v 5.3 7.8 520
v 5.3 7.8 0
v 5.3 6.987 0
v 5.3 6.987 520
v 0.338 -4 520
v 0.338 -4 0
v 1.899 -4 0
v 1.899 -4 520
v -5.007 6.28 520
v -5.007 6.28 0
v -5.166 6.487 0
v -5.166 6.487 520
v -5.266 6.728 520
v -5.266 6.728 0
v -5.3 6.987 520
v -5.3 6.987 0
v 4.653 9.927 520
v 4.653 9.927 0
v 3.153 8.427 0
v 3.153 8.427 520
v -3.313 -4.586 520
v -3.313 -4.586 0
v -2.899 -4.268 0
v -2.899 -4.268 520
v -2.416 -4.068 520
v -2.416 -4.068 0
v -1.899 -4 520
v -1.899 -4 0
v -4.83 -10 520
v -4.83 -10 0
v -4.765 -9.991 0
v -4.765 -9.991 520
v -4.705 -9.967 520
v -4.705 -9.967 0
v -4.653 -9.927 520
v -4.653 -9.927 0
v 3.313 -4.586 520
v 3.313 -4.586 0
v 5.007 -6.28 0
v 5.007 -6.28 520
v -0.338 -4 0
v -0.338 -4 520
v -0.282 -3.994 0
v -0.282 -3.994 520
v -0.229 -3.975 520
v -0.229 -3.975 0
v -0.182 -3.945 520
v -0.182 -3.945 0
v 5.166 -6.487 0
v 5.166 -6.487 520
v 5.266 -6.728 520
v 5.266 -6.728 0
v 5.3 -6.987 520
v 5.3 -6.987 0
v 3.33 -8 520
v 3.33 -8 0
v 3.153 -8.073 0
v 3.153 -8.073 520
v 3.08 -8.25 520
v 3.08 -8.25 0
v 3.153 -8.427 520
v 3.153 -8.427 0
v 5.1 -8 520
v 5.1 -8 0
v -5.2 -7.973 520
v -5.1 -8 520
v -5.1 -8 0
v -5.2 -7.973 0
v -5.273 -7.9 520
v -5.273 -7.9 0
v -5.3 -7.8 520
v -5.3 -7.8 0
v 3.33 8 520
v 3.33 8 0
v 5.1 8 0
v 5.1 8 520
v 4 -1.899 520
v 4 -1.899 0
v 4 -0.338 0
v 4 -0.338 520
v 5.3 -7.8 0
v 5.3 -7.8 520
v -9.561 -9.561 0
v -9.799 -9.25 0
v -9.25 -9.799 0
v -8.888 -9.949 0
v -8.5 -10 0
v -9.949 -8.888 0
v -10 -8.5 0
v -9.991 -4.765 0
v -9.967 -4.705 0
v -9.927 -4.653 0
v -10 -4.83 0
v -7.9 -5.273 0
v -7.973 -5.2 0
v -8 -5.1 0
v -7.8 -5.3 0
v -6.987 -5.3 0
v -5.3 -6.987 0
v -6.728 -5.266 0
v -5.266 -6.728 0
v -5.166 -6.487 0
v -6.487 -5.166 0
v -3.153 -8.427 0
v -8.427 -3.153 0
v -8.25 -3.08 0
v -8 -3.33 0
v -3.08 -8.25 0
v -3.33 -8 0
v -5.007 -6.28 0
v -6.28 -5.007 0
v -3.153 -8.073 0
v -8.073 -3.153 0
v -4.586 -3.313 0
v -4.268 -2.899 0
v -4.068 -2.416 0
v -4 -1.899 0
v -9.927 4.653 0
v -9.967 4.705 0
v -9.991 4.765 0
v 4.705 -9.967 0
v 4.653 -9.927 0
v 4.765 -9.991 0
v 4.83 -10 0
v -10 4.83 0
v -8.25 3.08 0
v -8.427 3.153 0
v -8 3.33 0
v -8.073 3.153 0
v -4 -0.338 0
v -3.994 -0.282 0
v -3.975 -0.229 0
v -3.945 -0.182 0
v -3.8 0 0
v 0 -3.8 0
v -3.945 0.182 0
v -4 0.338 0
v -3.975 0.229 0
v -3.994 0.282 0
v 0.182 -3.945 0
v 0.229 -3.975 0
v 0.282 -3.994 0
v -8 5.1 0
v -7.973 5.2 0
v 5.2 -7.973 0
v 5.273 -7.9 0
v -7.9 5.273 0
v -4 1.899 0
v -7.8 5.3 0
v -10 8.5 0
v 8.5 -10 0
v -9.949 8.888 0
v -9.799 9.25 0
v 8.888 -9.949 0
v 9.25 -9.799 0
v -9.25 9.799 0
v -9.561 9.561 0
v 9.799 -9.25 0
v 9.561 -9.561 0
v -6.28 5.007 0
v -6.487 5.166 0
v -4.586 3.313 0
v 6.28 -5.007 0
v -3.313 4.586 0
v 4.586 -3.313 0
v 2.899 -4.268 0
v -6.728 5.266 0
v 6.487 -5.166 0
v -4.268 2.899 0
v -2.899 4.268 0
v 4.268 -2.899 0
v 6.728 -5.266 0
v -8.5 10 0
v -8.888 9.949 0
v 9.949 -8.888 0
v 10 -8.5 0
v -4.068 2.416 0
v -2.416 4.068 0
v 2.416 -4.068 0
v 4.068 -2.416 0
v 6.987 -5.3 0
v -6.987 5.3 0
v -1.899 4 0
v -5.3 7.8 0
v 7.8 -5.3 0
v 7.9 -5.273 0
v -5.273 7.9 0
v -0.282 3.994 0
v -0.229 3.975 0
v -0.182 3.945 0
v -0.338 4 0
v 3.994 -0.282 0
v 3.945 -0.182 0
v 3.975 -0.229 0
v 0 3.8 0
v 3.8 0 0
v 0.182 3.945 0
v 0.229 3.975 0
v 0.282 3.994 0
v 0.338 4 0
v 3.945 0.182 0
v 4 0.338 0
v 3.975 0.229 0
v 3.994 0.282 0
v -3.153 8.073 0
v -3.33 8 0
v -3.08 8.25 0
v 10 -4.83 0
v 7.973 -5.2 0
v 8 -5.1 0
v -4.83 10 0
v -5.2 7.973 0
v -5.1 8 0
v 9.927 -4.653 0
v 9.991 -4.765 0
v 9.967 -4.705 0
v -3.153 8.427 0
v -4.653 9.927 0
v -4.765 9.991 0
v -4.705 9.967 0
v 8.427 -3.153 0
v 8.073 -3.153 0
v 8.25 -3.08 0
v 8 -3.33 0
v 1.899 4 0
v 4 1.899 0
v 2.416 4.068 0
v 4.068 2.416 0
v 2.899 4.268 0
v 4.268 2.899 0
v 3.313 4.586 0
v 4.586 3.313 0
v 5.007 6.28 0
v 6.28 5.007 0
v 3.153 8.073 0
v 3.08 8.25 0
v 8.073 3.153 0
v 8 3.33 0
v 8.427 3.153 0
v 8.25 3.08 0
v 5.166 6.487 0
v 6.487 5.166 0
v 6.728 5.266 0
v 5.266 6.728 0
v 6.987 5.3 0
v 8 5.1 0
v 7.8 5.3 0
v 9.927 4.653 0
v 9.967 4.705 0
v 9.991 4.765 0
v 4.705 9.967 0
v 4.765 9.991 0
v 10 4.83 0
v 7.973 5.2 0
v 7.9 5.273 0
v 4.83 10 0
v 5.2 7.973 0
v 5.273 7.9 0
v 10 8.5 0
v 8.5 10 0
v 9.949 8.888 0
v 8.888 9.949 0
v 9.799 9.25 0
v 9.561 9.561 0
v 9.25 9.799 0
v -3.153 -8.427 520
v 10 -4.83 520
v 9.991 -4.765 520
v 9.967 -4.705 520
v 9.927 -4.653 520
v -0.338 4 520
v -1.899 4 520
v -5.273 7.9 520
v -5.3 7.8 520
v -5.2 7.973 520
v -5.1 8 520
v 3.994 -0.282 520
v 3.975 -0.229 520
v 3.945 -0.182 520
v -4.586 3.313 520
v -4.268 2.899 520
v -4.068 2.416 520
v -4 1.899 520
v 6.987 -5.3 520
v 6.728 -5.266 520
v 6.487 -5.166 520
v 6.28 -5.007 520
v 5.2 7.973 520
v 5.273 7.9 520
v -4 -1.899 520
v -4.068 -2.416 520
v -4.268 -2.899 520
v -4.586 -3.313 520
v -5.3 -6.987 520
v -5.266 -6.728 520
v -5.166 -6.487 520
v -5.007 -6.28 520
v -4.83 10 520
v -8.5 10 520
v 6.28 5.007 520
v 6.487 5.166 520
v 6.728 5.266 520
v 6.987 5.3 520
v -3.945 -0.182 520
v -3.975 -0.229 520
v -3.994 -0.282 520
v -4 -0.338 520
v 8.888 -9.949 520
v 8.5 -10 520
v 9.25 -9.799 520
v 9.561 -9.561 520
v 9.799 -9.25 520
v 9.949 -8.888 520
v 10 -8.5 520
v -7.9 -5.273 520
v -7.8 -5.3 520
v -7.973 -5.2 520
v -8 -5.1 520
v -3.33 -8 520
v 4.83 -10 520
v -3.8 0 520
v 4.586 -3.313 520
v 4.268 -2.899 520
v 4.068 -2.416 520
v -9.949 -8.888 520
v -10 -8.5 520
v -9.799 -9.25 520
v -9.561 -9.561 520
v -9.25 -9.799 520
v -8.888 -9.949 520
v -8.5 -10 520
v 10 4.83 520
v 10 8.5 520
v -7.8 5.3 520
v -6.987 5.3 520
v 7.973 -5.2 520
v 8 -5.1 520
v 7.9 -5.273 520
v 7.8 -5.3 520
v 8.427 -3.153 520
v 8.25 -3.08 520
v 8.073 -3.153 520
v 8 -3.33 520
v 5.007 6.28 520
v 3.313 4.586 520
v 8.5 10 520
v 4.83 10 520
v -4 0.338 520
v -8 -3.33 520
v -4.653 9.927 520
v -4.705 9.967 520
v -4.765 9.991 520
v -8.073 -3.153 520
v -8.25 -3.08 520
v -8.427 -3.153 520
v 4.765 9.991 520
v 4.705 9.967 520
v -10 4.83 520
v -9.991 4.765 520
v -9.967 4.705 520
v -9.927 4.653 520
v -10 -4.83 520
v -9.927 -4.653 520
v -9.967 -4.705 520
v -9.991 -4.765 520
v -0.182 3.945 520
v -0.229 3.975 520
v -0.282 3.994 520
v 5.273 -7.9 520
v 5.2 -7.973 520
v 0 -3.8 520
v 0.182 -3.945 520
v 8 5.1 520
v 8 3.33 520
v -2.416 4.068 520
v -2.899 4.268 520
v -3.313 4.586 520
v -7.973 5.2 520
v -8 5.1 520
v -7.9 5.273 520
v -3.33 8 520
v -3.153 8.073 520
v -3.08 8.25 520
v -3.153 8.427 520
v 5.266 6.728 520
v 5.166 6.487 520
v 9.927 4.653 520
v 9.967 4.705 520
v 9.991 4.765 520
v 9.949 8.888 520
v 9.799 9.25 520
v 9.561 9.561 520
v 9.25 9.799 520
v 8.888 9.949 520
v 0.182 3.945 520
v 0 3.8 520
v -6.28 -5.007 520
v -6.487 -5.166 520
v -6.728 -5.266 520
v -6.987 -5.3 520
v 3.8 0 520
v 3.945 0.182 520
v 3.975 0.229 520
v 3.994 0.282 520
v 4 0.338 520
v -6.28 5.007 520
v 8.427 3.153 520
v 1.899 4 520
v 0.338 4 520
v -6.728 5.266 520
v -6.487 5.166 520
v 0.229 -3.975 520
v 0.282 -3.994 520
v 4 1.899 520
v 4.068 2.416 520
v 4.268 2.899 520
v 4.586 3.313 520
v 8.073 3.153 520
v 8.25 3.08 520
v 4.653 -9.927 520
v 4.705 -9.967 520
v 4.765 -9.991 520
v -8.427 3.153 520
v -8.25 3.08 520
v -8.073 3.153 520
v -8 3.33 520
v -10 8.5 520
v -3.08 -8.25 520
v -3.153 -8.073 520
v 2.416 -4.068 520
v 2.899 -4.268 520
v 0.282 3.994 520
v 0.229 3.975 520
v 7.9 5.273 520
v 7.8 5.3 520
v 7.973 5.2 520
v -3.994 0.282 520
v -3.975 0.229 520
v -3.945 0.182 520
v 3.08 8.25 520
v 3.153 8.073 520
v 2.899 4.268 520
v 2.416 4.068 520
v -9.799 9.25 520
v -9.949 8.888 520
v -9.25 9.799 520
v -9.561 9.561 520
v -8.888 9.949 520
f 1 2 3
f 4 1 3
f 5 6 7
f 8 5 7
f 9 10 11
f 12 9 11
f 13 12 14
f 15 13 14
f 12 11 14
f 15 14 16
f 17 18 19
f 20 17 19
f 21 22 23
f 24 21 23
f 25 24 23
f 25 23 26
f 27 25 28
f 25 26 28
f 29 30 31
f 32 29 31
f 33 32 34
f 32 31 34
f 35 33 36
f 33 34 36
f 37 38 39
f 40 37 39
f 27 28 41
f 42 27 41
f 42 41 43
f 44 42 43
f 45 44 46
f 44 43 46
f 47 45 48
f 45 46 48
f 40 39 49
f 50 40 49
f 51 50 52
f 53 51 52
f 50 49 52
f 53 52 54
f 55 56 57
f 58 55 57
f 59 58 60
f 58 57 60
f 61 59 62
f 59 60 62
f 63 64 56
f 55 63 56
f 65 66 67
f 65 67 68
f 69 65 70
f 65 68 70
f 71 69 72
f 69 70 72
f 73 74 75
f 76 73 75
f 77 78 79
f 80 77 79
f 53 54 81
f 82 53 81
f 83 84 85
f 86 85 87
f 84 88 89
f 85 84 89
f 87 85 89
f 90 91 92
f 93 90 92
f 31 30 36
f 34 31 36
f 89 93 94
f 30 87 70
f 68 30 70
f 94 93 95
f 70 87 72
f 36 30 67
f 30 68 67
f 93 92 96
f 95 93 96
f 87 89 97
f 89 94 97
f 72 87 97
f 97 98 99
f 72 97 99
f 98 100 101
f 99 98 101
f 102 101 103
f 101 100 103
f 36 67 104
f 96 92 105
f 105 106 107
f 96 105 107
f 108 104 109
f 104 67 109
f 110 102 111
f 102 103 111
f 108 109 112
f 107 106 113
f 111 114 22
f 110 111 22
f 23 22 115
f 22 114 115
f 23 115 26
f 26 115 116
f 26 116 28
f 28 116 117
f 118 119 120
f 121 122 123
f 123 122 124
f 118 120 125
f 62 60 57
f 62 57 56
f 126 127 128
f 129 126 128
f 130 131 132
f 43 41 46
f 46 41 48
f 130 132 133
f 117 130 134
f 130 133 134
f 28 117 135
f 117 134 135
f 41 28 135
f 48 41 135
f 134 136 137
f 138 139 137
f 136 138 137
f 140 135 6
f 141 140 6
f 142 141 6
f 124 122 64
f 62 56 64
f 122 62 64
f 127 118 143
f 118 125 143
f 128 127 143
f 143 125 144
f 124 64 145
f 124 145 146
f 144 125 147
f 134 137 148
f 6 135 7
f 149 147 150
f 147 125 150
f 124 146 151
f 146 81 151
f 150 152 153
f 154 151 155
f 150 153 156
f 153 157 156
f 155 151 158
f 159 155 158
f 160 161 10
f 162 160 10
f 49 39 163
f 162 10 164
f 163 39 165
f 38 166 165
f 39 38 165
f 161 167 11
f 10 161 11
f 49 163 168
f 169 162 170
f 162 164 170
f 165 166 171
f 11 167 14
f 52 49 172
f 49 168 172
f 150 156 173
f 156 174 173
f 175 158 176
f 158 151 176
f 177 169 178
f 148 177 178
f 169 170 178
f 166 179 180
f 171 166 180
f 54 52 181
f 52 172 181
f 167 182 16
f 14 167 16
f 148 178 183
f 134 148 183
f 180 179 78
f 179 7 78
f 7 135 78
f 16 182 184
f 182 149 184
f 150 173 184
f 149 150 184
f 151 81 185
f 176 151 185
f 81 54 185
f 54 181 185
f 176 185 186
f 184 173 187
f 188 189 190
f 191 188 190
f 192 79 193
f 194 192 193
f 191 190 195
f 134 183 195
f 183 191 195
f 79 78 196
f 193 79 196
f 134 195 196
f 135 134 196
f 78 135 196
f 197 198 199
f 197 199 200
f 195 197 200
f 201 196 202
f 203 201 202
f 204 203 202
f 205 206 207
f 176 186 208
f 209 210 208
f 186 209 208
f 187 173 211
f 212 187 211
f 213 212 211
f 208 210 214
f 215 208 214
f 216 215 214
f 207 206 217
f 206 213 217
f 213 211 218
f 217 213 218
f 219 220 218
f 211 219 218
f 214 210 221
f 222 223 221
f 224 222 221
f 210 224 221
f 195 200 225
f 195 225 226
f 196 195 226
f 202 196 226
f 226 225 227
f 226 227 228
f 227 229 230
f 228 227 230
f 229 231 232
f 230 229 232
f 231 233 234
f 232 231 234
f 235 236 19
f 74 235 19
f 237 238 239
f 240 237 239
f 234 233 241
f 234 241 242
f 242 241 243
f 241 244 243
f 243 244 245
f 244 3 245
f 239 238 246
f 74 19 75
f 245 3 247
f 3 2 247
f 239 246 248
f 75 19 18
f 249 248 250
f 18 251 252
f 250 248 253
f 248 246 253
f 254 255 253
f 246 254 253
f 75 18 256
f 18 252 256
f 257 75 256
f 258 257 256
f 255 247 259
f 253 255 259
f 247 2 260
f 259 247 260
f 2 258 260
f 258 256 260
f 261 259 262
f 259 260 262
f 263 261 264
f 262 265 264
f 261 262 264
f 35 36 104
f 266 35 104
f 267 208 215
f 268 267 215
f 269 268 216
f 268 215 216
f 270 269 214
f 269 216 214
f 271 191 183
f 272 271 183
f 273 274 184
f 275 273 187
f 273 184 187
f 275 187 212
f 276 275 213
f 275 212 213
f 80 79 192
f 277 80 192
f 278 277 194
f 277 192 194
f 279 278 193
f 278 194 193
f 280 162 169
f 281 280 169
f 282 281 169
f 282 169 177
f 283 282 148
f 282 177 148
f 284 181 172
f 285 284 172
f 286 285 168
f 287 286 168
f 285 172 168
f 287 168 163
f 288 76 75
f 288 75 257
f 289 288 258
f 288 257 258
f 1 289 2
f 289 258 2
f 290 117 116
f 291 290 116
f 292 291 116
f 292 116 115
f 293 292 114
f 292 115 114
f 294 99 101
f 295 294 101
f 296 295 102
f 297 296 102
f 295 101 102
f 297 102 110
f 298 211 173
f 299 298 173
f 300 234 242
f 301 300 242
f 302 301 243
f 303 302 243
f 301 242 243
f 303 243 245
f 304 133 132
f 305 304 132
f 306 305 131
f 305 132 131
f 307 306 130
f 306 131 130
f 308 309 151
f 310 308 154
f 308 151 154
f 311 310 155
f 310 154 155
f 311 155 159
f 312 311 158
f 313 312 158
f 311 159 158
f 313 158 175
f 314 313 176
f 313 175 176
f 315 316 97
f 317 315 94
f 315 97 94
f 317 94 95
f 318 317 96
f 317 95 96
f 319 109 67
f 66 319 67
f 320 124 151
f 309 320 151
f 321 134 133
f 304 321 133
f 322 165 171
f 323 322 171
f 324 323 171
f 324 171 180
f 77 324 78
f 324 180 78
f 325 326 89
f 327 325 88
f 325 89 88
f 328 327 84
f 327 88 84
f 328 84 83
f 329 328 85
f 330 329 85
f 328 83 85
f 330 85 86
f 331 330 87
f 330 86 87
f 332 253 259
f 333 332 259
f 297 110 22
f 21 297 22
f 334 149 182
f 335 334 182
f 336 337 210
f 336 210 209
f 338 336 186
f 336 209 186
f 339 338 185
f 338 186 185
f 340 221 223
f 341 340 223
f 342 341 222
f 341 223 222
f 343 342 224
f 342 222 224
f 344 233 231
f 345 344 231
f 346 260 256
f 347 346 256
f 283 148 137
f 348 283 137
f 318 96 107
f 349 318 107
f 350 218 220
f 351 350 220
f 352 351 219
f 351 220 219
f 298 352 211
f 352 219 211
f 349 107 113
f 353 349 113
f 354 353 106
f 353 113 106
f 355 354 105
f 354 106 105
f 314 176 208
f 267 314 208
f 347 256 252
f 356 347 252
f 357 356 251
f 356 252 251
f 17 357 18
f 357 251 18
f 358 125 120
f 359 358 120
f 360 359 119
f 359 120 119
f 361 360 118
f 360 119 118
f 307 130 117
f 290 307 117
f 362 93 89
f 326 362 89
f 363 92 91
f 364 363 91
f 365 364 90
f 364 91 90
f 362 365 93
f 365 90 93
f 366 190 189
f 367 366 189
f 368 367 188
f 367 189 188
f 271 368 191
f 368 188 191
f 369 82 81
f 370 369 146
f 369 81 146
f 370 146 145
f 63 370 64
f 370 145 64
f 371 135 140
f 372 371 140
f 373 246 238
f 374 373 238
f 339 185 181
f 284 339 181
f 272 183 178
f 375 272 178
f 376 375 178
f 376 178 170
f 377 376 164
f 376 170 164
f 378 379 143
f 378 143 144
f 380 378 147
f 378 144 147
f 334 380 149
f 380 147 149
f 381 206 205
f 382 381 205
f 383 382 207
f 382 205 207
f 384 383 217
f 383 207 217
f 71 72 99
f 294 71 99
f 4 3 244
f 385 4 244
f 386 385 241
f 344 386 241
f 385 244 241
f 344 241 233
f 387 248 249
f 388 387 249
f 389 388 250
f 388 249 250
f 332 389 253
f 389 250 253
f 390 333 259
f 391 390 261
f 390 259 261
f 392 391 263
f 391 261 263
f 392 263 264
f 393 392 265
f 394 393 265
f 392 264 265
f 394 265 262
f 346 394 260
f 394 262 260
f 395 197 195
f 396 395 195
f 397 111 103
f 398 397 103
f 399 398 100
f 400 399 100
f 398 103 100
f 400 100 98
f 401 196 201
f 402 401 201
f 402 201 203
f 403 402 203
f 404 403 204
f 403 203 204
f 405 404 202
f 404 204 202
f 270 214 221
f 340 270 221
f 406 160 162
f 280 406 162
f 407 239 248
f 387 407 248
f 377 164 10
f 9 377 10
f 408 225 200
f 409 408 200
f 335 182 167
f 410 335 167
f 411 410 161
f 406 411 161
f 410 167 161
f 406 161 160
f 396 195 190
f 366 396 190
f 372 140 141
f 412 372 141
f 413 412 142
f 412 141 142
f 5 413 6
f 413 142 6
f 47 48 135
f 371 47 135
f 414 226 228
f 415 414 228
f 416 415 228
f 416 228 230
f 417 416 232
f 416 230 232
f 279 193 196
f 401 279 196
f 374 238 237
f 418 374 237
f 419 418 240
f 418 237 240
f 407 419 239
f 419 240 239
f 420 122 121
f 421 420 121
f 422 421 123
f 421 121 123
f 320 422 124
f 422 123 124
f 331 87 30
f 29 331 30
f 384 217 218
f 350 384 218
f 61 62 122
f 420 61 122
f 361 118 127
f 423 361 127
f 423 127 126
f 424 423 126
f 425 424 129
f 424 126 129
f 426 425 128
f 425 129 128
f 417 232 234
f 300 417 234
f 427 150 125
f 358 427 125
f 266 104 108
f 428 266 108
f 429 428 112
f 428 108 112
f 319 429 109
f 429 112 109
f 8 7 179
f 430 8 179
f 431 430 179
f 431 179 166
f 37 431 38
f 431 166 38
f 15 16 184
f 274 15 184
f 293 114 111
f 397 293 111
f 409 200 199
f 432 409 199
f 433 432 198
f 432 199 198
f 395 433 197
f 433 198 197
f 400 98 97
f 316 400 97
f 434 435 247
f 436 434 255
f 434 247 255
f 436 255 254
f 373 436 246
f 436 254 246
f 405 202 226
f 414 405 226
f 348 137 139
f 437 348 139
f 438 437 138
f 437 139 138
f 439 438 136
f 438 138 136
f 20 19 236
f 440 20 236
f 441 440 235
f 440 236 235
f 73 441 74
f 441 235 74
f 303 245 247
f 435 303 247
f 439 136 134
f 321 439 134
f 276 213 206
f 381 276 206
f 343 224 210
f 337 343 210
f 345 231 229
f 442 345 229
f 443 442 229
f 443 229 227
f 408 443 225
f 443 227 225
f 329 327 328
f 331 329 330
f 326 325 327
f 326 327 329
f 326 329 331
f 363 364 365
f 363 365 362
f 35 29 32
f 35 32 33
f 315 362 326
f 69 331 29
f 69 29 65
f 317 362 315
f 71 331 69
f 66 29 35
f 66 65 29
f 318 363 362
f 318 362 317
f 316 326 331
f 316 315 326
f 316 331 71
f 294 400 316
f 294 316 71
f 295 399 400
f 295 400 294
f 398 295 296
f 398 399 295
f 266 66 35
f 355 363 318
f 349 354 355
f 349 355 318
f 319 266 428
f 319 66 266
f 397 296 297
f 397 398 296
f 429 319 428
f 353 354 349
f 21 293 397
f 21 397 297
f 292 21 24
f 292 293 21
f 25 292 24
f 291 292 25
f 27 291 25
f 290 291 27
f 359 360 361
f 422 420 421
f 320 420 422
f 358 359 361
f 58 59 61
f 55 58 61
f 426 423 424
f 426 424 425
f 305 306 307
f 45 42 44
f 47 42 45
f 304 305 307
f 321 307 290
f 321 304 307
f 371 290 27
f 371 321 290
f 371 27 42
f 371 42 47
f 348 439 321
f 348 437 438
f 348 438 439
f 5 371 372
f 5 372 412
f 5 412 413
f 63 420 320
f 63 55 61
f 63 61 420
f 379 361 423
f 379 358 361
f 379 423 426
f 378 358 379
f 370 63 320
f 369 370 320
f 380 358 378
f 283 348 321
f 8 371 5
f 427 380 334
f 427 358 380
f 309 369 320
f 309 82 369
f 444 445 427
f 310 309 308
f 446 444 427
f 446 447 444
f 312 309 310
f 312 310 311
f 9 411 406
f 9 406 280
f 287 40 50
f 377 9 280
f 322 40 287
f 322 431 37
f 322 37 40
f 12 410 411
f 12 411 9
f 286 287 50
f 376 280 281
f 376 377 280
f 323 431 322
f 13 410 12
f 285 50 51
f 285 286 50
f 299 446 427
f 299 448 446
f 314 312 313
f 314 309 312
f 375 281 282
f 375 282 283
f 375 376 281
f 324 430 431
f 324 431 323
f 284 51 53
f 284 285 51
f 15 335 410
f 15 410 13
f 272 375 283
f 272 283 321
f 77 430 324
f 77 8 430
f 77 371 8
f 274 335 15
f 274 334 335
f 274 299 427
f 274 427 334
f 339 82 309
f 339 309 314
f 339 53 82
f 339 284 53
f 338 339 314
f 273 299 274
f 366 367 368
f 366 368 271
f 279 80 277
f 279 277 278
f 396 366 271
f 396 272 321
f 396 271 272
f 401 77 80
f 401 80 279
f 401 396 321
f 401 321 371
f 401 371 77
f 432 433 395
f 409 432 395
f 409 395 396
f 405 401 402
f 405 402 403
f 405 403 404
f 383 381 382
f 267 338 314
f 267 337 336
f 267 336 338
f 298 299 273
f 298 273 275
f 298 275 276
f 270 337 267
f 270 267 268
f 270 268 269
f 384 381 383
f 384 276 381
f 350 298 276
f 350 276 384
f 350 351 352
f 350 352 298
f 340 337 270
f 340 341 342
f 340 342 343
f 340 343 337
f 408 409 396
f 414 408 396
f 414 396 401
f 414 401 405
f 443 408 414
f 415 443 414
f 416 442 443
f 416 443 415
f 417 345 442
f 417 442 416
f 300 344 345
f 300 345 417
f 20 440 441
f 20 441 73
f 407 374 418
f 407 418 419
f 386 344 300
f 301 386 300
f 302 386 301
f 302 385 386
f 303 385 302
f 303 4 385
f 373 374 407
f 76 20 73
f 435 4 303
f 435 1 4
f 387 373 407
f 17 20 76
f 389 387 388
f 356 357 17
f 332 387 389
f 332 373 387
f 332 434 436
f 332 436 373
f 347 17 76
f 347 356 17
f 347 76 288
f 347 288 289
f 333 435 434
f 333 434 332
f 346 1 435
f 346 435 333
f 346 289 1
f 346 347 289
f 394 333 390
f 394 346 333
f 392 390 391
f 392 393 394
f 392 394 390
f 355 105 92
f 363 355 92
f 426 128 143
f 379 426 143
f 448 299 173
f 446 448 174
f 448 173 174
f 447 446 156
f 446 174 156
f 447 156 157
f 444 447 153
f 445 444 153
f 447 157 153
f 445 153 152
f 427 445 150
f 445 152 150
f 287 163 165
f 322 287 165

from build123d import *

# Parameters (mm, degrees)
EXTRUDE_1_DEPTH = 520


# Read off the part's stored shape, not the designer's step: 222 Конструкционный профиль 20х20-1-surface1
with BuildPart() as part:
    # Эскиз1 → Бобышка-Вытянуть1 (new body)
    with BuildSketch(Plane.XY):
        with BuildLine():
            Line((-3.945217202, 0.181521503), (-3.8, 0))
            Line((-3.8, 0), (-3.945217202, -0.181521503))
            ThreePointArc((-3.945217202, -0.181521503), (-3.98590708, -0.254943529), (-4, -0.337695265))
            Line((-4, -0.337695265), (-4, -1.898780669))
            ThreePointArc((-4, -1.898780669), (-4.152240935, -2.664147534), (-4.585786438, -3.312994231))
            Line((-4.585786438, -3.312994231), (-6.279898987, -5.007106781))
            ThreePointArc((-6.279898987, -5.007106781), (-6.604322336, -5.223879533), (-6.987005769, -5.3))
            Line((-6.987005769, -5.3), (-7.8, -5.3))
            ThreePointArc((-7.8, -5.3), (-7.941421356, -5.241421356), (-8, -5.1))
            Line((-8, -5.1), (-8, -3.33))
            ThreePointArc((-8, -3.33), (-8.154329142, -3.099030117), (-8.426776695, -3.153223305))
            Line((-8.426776695, -3.153223305), (-9.926776695, -4.653223305))
            ThreePointArc((-9.926776695, -4.653223305), (-9.980969883, -4.734329142), (-10, -4.83))
            Line((-10, -4.83), (-10, -8.5))
            ThreePointArc((-10, -8.5), (-9.560660172, -9.560660172), (-8.5, -10))
            Line((-8.5, -10), (-4.83, -10))
            ThreePointArc((-4.83, -10), (-4.734329142, -9.980969883), (-4.653223305, -9.926776695))
            Line((-4.653223305, -9.926776695), (-3.153223305, -8.426776695))
            ThreePointArc((-3.153223305, -8.426776695), (-3.099030117, -8.154329142), (-3.33, -8))
            Line((-3.33, -8), (-5.1, -8))
            ThreePointArc((-5.1, -8), (-5.241421356, -7.941421356), (-5.3, -7.8))
            Line((-5.3, -7.8), (-5.3, -6.987005769))
            ThreePointArc((-5.3, -6.987005769), (-5.223879533, -6.604322336), (-5.007106781, -6.279898987))
            Line((-5.007106781, -6.279898987), (-3.312994231, -4.585786438))
            ThreePointArc((-3.312994231, -4.585786438), (-2.664147534, -4.152240935), (-1.898780669, -4))
            Line((-1.898780669, -4), (-0.337695265, -4))
            ThreePointArc((-0.337695265, -4), (-0.254943529, -3.98590708), (-0.181521503, -3.945217202))
            Line((-0.181521503, -3.945217202), (0, -3.8))
            Line((0, -3.8), (0.181521503, -3.945217202))
            ThreePointArc((0.181521503, -3.945217202), (0.254943529, -3.98590708), (0.337695265, -4))
            Line((0.337695265, -4), (1.898780669, -4))
            ThreePointArc((1.898780669, -4), (2.664147534, -4.152240935), (3.312994231, -4.585786438))
            Line((3.312994231, -4.585786438), (5.007106781, -6.279898987))
            ThreePointArc((5.007106781, -6.279898987), (5.223879533, -6.604322336), (5.3, -6.987005769))
            Line((5.3, -6.987005769), (5.3, -7.8))
            ThreePointArc((5.3, -7.8), (5.241421356, -7.941421356), (5.1, -8))
            Line((5.1, -8), (3.33, -8))
            ThreePointArc((3.33, -8), (3.099030117, -8.154329142), (3.153223305, -8.426776695))
            Line((3.153223305, -8.426776695), (4.653223305, -9.926776695))
            ThreePointArc((4.653223305, -9.926776695), (4.734329142, -9.980969883), (4.83, -10))
            Line((4.83, -10), (8.5, -10))
            ThreePointArc((8.5, -10), (9.560660172, -9.560660172), (10, -8.5))
            Line((10, -8.5), (10, -4.83))
            ThreePointArc((10, -4.83), (9.980969883, -4.734329142), (9.926776695, -4.653223305))
            Line((9.926776695, -4.653223305), (8.426776695, -3.153223305))
            ThreePointArc((8.426776695, -3.153223305), (8.154329142, -3.099030117), (8, -3.33))
            Line((8, -3.33), (8, -5.1))
            ThreePointArc((8, -5.1), (7.941421356, -5.241421356), (7.8, -5.3))
            Line((7.8, -5.3), (6.987005769, -5.3))
            ThreePointArc((6.987005769, -5.3), (6.604322336, -5.223879533), (6.279898987, -5.007106781))
            Line((6.279898987, -5.007106781), (4.585786438, -3.312994231))
            ThreePointArc((4.585786438, -3.312994231), (4.152240935, -2.664147534), (4, -1.898780669))
            Line((4, -1.898780669), (4, -0.337695265))
            ThreePointArc((4, -0.337695265), (3.98590708, -0.254943529), (3.945217202, -0.181521503))
            Line((3.945217202, -0.181521503), (3.8, 0))
            Line((3.8, 0), (3.945217202, 0.181521503))
            ThreePointArc((3.945217202, 0.181521503), (3.98590708, 0.254943529), (4, 0.337695265))
            Line((4, 0.337695265), (4, 1.898780669))
            ThreePointArc((4, 1.898780669), (4.152240935, 2.664147534), (4.585786438, 3.312994231))
            Line((4.585786438, 3.312994231), (6.279898987, 5.007106781))
            ThreePointArc((6.279898987, 5.007106781), (6.604322336, 5.223879533), (6.987005769, 5.3))
            Line((6.987005769, 5.3), (7.8, 5.3))
            ThreePointArc((7.8, 5.3), (7.941421356, 5.241421356), (8, 5.1))
            Line((8, 5.1), (8, 3.33))
            ThreePointArc((8, 3.33), (8.154329142, 3.099030117), (8.426776695, 3.153223305))
            Line((8.426776695, 3.153223305), (9.926776695, 4.653223305))
            ThreePointArc((9.926776695, 4.653223305), (9.980969883, 4.734329142), (10, 4.83))
            Line((10, 4.83), (10, 8.5))
            ThreePointArc((10, 8.5), (9.560660172, 9.560660172), (8.5, 10))
            Line((8.5, 10), (4.83, 10))
            ThreePointArc((4.83, 10), (4.734329142, 9.980969883), (4.653223305, 9.926776695))
            Line((4.653223305, 9.926776695), (3.153223305, 8.426776695))
            ThreePointArc((3.153223305, 8.426776695), (3.099030117, 8.154329142), (3.33, 8))
            Line((3.33, 8), (5.1, 8))
            ThreePointArc((5.1, 8), (5.241421356, 7.941421356), (5.3, 7.8))
            Line((5.3, 7.8), (5.3, 6.987005769))
            ThreePointArc((5.3, 6.987005769), (5.223879533, 6.604322336), (5.007106781, 6.279898987))
            Line((5.007106781, 6.279898987), (3.312994231, 4.585786438))
            ThreePointArc((3.312994231, 4.585786438), (2.664147534, 4.152240935), (1.898780669, 4))
            Line((1.898780669, 4), (0.337695265, 4))
            ThreePointArc((0.337695265, 4), (0.254943529, 3.98590708), (0.181521503, 3.945217202))
            Line((0.181521503, 3.945217202), (0, 3.8))
            Line((0, 3.8), (-0.181521503, 3.945217202))
            ThreePointArc((-0.181521503, 3.945217202), (-0.254943529, 3.98590708), (-0.337695265, 4))
            Line((-0.337695265, 4), (-1.898780669, 4))
            ThreePointArc((-1.898780669, 4), (-2.664147534, 4.152240935), (-3.312994231, 4.585786438))
            Line((-3.312994231, 4.585786438), (-5.007106781, 6.279898987))
            ThreePointArc((-5.007106781, 6.279898987), (-5.223879533, 6.604322336), (-5.3, 6.987005769))
            Line((-5.3, 6.987005769), (-5.3, 7.8))
            ThreePointArc((-5.3, 7.8), (-5.241421356, 7.941421356), (-5.1, 8))
            Line((-5.1, 8), (-3.33, 8))
            ThreePointArc((-3.33, 8), (-3.099030117, 8.154329142), (-3.153223305, 8.426776695))
            Line((-3.153223305, 8.426776695), (-4.653223305, 9.926776695))
            ThreePointArc((-4.653223305, 9.926776695), (-4.734329142, 9.980969883), (-4.83, 10))
            Line((-4.83, 10), (-8.5, 10))
            ThreePointArc((-8.5, 10), (-9.560660172, 9.560660172), (-10, 8.5))
            Line((-10, 8.5), (-10, 4.83))
            ThreePointArc((-10, 4.83), (-9.980969883, 4.734329142), (-9.926776695, 4.653223305))
            Line((-9.926776695, 4.653223305), (-8.426776695, 3.153223305))
            ThreePointArc((-8.426776695, 3.153223305), (-8.154329142, 3.099030117), (-8, 3.33))
            Line((-8, 3.33), (-8, 5.1))
            ThreePointArc((-8, 5.1), (-7.941421356, 5.241421356), (-7.8, 5.3))
            Line((-7.8, 5.3), (-6.987005769, 5.3))
            ThreePointArc((-6.987005769, 5.3), (-6.604322336, 5.223879533), (-6.279898987, 5.007106781))
            Line((-6.279898987, 5.007106781), (-4.585786438, 3.312994231))
            ThreePointArc((-4.585786438, 3.312994231), (-4.152240935, 2.664147534), (-4, 1.898780669))
            Line((-4, 1.898780669), (-4, 0.337695265))
            ThreePointArc((-4, 0.337695265), (-3.98590708, 0.254943529), (-3.945217202, 0.181521503))
        make_face()
    extrude(amount=EXTRUDE_1_DEPTH)


solid = part.part
